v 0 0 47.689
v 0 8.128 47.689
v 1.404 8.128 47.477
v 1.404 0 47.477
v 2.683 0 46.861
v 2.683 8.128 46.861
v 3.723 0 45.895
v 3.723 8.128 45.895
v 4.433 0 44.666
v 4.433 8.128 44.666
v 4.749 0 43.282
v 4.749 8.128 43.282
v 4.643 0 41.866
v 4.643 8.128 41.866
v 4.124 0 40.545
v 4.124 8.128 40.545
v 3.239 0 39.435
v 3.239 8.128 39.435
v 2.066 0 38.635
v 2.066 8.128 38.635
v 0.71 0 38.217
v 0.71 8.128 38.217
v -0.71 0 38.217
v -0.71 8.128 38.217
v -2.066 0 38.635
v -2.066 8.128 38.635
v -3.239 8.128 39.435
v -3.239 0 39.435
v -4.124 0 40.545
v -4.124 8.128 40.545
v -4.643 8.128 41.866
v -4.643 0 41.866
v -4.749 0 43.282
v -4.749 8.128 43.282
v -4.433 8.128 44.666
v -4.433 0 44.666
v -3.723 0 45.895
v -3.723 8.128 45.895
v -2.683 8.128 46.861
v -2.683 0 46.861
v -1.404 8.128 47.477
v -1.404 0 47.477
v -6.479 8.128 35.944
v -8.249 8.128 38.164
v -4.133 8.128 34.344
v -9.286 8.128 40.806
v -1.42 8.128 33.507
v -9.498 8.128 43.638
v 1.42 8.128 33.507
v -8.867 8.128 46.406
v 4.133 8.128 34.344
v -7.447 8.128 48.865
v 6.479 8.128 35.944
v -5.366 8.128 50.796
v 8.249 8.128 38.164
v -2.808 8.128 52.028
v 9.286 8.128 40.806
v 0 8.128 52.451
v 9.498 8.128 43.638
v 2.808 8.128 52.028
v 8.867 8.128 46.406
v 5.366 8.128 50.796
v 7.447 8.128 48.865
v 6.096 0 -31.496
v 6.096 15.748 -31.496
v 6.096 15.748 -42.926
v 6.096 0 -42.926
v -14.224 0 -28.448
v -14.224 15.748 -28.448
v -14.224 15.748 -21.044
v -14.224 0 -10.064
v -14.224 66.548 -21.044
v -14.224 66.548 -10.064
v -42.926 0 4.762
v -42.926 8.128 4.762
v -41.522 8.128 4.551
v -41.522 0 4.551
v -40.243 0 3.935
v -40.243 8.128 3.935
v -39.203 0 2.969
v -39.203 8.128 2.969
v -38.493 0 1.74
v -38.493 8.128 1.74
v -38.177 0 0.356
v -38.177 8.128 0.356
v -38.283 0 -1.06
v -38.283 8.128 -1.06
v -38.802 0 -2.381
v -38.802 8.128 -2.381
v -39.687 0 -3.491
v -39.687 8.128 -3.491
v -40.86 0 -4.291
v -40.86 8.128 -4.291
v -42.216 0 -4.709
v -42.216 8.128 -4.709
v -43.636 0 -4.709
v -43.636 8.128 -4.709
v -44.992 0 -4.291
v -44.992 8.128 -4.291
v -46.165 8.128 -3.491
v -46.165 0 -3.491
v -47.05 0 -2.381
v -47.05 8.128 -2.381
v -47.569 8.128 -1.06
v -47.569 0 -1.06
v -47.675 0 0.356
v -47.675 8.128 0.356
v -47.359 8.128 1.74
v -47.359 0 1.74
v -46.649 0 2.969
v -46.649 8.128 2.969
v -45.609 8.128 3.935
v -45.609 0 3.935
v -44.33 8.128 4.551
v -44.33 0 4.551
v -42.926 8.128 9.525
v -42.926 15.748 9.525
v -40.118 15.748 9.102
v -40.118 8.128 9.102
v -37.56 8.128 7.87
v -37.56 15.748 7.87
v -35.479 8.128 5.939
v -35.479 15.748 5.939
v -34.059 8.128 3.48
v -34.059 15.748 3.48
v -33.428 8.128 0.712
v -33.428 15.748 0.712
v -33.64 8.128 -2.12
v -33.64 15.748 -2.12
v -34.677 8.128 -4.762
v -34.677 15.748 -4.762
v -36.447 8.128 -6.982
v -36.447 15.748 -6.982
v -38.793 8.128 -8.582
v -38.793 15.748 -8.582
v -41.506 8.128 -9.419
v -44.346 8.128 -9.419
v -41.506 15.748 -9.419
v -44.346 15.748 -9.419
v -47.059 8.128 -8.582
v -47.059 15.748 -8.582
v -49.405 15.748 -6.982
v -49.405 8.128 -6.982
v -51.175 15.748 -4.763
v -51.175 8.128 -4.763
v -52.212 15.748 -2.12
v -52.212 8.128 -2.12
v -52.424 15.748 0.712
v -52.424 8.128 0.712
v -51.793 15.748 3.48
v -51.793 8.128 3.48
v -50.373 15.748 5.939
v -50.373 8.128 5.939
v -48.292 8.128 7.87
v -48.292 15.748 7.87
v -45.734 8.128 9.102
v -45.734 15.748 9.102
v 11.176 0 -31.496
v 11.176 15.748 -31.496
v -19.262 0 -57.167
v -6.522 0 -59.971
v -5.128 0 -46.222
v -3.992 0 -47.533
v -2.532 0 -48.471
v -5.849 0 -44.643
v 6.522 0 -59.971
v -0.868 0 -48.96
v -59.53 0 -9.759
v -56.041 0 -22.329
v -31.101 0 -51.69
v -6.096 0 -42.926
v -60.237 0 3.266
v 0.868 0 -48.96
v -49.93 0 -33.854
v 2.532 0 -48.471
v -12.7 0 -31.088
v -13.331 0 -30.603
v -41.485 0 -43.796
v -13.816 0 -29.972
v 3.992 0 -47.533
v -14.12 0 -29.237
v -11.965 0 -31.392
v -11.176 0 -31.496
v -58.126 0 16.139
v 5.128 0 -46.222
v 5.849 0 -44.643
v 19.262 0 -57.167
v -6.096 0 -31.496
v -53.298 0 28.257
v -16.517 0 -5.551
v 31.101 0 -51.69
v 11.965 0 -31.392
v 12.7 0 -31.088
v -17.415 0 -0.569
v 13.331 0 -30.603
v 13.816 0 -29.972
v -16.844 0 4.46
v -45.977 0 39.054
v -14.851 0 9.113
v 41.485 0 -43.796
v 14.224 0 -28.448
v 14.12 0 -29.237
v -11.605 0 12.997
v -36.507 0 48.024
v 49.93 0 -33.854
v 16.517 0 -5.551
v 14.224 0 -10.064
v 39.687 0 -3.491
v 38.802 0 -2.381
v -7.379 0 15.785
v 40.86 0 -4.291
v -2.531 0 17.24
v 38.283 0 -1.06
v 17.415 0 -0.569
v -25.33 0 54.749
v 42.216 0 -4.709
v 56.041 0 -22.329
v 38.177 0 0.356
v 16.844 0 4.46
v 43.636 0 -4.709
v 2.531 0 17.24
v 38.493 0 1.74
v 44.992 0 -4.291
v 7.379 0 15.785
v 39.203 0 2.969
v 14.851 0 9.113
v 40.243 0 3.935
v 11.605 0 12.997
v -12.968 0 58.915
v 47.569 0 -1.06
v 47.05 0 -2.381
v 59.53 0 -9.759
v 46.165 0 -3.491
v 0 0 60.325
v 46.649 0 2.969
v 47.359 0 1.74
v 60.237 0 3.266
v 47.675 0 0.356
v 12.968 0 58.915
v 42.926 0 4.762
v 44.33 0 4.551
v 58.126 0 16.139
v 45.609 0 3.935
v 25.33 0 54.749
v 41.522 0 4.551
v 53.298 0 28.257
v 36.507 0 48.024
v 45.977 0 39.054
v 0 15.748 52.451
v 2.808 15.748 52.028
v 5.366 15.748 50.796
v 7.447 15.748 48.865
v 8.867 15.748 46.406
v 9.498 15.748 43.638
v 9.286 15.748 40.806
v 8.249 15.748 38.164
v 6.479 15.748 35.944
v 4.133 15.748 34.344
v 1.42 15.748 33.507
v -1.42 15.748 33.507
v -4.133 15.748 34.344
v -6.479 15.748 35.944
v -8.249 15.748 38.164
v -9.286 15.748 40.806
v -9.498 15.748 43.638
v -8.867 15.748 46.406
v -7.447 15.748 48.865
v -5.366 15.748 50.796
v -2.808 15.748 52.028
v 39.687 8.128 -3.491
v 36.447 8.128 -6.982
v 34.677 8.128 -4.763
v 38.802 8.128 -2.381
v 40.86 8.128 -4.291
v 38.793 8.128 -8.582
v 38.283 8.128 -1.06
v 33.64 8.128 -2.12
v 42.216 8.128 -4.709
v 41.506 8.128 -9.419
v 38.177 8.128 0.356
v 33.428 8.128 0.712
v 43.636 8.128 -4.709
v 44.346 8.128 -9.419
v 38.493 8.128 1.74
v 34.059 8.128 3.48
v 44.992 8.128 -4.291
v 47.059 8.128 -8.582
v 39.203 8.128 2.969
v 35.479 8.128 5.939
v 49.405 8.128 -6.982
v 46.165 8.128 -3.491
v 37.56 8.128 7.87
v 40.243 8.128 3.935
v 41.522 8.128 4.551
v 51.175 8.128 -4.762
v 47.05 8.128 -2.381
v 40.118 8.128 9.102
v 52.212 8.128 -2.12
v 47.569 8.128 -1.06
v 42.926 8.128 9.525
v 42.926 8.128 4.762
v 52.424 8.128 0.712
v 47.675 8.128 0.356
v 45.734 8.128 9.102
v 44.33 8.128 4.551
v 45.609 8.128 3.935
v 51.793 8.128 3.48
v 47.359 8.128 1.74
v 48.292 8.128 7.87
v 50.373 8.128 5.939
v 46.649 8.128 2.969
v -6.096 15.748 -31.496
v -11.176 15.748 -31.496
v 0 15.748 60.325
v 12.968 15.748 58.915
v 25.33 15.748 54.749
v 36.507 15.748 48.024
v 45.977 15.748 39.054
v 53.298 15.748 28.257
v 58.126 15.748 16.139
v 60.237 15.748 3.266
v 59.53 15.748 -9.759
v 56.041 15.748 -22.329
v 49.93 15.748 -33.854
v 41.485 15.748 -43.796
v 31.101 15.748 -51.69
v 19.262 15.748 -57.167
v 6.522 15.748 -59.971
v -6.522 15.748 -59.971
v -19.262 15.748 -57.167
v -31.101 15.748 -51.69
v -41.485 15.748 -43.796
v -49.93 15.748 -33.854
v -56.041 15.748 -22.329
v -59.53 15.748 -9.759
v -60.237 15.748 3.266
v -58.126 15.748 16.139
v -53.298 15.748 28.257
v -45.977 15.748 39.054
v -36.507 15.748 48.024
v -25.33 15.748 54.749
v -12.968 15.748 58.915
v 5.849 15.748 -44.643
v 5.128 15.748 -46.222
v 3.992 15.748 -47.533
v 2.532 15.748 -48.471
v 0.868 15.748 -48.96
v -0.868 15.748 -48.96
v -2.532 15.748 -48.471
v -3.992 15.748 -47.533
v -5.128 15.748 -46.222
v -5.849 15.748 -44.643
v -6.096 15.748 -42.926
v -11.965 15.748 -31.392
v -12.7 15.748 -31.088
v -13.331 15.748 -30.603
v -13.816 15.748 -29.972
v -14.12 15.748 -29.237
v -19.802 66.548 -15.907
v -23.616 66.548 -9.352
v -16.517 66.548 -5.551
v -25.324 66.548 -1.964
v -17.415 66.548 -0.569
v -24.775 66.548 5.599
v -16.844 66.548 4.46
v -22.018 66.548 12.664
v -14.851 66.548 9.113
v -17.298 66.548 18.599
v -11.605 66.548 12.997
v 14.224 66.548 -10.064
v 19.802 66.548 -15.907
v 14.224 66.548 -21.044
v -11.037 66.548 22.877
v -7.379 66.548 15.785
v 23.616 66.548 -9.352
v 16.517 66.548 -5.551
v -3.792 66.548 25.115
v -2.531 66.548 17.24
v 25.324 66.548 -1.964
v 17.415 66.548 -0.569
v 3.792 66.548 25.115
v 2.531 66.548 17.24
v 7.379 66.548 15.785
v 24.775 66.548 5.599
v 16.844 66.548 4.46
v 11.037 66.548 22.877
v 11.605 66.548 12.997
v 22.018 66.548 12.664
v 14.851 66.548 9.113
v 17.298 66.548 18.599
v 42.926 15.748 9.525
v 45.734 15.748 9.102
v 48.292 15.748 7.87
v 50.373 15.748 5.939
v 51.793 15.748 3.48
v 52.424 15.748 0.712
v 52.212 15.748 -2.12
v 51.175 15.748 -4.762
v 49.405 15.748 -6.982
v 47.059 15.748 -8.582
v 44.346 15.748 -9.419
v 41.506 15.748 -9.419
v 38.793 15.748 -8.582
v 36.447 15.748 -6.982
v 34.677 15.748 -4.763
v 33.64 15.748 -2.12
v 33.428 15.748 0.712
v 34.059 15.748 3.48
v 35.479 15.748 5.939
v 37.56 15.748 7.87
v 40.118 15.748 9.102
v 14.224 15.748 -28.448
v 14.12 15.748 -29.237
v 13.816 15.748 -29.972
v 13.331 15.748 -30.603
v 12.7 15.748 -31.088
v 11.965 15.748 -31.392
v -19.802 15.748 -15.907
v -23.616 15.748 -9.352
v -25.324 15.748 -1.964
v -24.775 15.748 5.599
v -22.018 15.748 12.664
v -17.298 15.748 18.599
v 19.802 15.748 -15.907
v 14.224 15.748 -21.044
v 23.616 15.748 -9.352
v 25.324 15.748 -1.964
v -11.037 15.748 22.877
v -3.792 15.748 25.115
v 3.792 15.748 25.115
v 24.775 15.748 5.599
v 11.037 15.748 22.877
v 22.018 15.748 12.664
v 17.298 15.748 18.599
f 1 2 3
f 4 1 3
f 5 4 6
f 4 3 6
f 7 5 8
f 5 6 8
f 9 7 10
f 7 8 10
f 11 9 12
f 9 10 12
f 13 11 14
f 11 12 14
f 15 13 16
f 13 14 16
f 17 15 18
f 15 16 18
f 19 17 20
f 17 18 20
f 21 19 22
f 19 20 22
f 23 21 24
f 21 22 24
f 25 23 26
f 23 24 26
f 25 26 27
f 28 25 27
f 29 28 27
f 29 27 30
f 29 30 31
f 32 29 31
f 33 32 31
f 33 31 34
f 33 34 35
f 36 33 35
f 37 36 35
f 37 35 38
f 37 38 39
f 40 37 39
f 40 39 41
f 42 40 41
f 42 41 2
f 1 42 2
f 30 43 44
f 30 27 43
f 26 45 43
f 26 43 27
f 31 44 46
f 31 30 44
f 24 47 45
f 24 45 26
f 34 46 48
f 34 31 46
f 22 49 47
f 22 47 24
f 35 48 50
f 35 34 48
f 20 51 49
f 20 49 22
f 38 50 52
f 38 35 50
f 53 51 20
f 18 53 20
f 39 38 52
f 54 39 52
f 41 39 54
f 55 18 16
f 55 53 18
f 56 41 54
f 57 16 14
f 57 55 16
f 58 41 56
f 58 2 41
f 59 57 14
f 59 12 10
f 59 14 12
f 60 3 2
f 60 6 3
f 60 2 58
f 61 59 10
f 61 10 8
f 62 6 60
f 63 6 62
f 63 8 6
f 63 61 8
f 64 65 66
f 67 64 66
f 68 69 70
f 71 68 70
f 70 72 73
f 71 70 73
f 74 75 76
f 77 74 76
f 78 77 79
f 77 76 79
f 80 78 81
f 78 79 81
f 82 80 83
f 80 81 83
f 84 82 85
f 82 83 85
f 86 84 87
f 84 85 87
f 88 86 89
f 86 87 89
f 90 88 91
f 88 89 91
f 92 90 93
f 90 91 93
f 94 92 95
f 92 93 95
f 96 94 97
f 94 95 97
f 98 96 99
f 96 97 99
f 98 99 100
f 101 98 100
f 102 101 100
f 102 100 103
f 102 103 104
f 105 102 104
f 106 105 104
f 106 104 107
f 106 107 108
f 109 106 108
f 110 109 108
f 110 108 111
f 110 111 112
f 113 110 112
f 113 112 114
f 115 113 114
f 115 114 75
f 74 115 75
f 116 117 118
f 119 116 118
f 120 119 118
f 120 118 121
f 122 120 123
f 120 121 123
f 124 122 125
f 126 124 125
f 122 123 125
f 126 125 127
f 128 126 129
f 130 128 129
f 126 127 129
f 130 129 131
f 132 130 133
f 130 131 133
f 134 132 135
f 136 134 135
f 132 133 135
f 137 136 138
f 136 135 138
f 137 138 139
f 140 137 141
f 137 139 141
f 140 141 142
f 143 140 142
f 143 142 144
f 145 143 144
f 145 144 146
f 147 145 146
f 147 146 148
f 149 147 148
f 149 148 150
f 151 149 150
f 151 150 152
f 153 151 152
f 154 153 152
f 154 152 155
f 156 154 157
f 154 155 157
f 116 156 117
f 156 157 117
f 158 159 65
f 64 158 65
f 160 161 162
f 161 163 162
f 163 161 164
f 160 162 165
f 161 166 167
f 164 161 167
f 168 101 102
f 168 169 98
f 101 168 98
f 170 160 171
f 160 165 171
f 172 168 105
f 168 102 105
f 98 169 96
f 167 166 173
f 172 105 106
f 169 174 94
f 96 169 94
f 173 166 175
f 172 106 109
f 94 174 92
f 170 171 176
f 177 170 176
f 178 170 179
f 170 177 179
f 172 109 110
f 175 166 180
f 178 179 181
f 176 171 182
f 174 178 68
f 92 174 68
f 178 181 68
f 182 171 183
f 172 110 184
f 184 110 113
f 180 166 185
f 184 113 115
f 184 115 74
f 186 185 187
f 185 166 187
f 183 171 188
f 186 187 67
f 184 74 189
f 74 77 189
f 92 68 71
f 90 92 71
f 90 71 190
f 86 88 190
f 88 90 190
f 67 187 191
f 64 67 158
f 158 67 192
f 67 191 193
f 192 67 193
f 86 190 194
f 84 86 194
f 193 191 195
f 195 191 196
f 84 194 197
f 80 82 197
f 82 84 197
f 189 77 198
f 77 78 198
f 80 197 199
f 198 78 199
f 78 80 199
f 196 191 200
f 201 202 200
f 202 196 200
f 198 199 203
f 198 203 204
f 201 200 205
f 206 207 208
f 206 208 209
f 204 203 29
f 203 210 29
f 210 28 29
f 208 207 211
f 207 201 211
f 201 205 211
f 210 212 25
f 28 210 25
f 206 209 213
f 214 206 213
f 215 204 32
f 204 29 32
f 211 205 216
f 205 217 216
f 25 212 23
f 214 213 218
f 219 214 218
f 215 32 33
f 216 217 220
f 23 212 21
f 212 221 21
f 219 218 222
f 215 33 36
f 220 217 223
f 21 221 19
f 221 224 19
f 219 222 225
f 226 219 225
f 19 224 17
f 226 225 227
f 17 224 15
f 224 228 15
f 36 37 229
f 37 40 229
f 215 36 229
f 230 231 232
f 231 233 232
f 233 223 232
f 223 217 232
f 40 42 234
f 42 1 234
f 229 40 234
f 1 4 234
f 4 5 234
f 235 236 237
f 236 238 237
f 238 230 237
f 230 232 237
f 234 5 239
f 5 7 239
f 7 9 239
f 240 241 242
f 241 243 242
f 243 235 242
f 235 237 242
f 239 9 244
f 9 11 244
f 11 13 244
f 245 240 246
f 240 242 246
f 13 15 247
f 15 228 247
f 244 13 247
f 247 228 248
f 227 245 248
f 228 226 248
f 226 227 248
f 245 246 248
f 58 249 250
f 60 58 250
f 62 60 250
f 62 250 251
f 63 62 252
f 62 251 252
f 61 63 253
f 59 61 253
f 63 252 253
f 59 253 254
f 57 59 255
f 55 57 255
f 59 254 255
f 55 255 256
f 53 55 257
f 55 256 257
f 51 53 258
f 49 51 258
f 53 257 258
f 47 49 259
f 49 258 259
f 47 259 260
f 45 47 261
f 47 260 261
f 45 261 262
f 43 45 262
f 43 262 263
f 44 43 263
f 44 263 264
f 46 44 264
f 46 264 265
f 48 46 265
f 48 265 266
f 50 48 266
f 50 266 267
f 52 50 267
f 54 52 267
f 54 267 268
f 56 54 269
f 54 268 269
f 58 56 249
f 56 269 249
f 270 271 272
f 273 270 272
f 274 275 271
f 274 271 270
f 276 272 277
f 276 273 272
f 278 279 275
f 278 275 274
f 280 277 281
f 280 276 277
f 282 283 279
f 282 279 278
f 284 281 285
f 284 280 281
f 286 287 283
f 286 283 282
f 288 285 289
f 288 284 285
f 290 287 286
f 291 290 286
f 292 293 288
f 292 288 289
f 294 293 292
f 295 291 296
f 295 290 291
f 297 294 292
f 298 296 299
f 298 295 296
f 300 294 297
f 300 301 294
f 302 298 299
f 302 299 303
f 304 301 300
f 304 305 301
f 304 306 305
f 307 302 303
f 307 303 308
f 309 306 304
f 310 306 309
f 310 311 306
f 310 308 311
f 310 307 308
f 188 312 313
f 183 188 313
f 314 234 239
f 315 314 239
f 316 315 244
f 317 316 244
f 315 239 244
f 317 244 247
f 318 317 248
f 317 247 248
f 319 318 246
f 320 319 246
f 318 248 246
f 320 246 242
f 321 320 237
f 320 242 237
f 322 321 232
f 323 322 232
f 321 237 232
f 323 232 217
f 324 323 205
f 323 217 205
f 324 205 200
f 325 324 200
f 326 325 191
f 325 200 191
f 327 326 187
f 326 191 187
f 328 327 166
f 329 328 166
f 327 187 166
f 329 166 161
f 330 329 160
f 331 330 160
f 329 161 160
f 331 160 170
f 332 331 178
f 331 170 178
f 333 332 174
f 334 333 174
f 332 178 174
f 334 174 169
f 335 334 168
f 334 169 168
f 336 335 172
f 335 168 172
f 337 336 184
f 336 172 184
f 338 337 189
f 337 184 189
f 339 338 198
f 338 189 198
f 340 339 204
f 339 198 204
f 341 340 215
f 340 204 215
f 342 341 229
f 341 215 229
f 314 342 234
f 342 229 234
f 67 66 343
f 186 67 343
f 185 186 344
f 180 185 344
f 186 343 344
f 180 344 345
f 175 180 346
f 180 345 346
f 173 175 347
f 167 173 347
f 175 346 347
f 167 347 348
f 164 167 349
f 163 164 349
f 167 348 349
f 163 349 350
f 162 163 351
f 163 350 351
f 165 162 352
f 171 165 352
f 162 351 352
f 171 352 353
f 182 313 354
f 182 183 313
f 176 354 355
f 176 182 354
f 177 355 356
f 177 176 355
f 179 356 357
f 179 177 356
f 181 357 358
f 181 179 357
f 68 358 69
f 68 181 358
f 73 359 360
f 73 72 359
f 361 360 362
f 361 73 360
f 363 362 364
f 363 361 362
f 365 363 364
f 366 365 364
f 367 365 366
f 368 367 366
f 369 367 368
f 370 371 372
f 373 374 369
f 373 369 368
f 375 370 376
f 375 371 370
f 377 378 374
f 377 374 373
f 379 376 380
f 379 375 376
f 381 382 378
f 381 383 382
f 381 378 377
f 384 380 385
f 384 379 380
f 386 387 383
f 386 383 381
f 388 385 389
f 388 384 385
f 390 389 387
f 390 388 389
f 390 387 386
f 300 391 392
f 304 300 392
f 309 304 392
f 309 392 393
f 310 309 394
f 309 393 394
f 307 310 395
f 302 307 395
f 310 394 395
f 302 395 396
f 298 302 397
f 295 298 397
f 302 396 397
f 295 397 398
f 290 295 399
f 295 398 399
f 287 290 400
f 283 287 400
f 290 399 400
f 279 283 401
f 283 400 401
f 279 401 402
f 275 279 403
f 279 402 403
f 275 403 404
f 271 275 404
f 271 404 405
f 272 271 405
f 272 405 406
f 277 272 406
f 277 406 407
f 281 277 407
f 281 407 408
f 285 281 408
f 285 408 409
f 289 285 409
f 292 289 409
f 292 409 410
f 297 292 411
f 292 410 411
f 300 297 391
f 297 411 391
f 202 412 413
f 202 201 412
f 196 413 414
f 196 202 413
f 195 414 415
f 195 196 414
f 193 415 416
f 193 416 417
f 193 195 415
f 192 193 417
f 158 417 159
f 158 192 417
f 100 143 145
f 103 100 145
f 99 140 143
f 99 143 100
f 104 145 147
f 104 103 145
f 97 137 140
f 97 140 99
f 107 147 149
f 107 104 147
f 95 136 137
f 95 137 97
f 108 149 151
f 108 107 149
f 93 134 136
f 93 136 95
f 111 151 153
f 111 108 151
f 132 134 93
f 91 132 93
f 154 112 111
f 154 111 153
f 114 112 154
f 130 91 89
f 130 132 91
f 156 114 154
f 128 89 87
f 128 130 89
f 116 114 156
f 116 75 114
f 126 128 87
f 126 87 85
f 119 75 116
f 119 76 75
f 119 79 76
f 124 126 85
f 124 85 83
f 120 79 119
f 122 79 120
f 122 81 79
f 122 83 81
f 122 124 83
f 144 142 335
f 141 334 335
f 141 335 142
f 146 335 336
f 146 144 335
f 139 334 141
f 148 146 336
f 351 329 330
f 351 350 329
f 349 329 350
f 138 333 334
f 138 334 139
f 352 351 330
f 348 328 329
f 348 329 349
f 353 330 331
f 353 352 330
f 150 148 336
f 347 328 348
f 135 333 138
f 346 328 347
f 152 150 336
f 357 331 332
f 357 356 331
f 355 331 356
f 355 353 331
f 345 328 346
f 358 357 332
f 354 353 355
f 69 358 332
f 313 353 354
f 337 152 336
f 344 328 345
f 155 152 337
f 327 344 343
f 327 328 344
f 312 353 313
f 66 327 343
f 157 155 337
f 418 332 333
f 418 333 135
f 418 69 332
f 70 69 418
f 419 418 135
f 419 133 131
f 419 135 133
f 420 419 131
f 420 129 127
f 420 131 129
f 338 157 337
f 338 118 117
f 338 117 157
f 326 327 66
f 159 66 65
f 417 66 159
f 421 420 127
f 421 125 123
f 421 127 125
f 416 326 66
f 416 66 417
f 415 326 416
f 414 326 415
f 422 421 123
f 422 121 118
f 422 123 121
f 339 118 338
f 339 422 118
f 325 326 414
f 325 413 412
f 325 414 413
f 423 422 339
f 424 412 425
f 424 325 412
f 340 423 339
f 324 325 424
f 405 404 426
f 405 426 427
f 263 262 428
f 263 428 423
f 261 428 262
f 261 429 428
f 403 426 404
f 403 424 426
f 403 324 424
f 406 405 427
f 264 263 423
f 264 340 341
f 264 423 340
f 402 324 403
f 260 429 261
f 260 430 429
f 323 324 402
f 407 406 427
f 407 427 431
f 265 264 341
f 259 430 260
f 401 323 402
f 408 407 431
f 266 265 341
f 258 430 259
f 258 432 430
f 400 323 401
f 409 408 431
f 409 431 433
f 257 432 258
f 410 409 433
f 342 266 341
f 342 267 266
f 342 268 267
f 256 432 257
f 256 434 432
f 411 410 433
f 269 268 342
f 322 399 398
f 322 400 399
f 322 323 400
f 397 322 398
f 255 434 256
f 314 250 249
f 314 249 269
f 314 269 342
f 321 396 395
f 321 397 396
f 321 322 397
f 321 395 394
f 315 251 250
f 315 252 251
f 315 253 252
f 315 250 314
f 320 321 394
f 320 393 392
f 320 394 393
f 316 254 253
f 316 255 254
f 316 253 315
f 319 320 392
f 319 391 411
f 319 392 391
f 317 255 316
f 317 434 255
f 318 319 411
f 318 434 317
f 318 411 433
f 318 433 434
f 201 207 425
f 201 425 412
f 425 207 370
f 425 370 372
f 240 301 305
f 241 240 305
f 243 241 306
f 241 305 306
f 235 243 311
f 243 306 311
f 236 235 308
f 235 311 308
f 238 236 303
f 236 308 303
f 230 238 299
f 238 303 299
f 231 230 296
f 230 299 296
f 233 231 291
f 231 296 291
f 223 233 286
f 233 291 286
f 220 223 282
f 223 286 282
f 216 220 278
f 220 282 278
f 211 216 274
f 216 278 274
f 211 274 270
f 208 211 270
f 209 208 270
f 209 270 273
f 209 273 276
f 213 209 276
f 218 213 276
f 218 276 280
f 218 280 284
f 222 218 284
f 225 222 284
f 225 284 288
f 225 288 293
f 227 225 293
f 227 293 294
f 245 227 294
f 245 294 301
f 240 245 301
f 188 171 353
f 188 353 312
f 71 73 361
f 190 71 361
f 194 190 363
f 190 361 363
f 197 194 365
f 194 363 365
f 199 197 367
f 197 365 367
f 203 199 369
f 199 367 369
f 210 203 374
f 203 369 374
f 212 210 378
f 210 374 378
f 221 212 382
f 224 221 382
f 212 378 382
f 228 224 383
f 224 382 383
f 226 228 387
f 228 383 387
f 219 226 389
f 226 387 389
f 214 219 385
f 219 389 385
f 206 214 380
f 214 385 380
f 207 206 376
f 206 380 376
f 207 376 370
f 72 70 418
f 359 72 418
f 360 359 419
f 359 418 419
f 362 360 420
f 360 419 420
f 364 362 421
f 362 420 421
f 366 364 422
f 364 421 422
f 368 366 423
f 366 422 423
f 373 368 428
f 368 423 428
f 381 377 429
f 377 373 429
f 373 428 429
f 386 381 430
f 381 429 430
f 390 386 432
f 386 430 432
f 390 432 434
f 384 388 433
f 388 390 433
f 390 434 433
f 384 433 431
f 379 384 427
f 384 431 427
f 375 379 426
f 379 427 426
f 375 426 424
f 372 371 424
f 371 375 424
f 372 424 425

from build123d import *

# Parameters (mm, degrees)
SKETCH1_R           = 60.325
BOSS_EXTRUDE1_DEPTH = 15.748
SKETCH2_R           = 9.525
CUT_EXTRUDE1_DEPTH  = 7.62
SKETCH3_R           = 4.7625
CUT_EXTRUDE2_DEPTH  = 86.698749314
SKETCH4_R           = 25.4
BOSS_EXTRUDE2_DEPTH = 50.8
SKETCH5_R           = 17.4244
CUT_EXTRUDE3_DEPTH  = 109.198186464
CUT_EXTRUDE4_DEPTH  = 109.198186464
FILLET1_R           = 3.048


with BuildPart() as part:
    # Sketch1 → Boss-Extrude1 (new body)
    with BuildSketch(Plane(origin=(0, 0, 0), x_dir=(1, 0, 0), z_dir=(0, 1, 0))):
        with Locations(Location((0, 0, 0), (0, 0, 270))):
            Circle(SKETCH1_R)
    extrude(amount=BOSS_EXTRUDE1_DEPTH)

    # Sketch2 → Cut-Extrude1 (cut)
    with BuildSketch(Plane(origin=(0, 15.748, 0), x_dir=(1, 0, 0), z_dir=(0, 1, 0))):
        with Locations(Location((0, -42.926, 0), (0, 0, 270))):
            Circle(SKETCH2_R)
        with Locations(Location((42.926, 0, 0), (0, 0, 270))):
            Circle(SKETCH2_R)
        with Locations(Location((-42.926, 0, 0), (0, 0, 270))):
            Circle(SKETCH2_R)
    extrude(amount=-CUT_EXTRUDE1_DEPTH, mode=Mode.SUBTRACT)

    # Sketch3 → Cut-Extrude2 (cut, through all)
    with BuildSketch(Plane(origin=(0, 8.128, 0), x_dir=(1, 0, 0), z_dir=(0, 1, 0))):
        with Locations(Location((-42.926, 0, 0), (0, 0, 270))):
            Circle(SKETCH3_R)
        with Locations(Location((42.926, 0, 0), (0, 0, 270))):
            Circle(SKETCH3_R)
        with Locations(Location((0, -42.926, 0), (0, 0, 270))):
            Circle(SKETCH3_R)
    extrude(amount=-CUT_EXTRUDE2_DEPTH, mode=Mode.SUBTRACT)

    # Sketch4 → Boss-Extrude2 (add)
    with BuildSketch(Plane(origin=(0, 15.748, 0), x_dir=(1, 0, 0), z_dir=(0, 1, 0))):
        with Locations(Location((0, 0, 0), (0, 0, 270))):
            Circle(SKETCH4_R)
    extrude(amount=BOSS_EXTRUDE2_DEPTH)

    # Sketch5 → Cut-Extrude3 (cut, through all)
    with BuildSketch(Plane(origin=(0, 66.548, 0), x_dir=(1, 0, 0), z_dir=(0, 1, 0))):
        with Locations(Location((0, 0, 0), (0, 0, 270))):
            Circle(SKETCH5_R)
    extrude(amount=-CUT_EXTRUDE3_DEPTH, mode=Mode.SUBTRACT)

    # Sketch7 → Cut-Extrude4 (cut, through all)
    with BuildSketch(Plane(origin=(0, 66.548, 0), x_dir=(1, 0, 0), z_dir=(0, 1, 0))):
        with BuildLine():
            Line((-6.096, 42.926), (-6.096, 31.496))
            Line((-6.096, 31.496), (-14.224, 31.496))
            Line((-14.224, 31.496), (-14.224, 0))
            Line((-14.224, 0), (14.224, 0))
            Line((14.224, 0), (14.224, 31.496))
            Line((14.224, 31.496), (6.096, 31.496))
            Line((6.096, 31.496), (6.096, 42.926))
            ThreePointArc((6.096, 42.926), (0, 49.022), (-6.096, 42.926))
        make_face()
    extrude(amount=-CUT_EXTRUDE4_DEPTH, mode=Mode.SUBTRACT)

    # Fillet1
    fillet1_edges = [part.edges().sort_by_distance(p)[0] for p in [
        (14.224, 7.874, -31.496),
        (-14.224, 7.874, -31.496),
    ]]
    fillet(fillet1_edges, radius=FILLET1_R)


solid = part.part
